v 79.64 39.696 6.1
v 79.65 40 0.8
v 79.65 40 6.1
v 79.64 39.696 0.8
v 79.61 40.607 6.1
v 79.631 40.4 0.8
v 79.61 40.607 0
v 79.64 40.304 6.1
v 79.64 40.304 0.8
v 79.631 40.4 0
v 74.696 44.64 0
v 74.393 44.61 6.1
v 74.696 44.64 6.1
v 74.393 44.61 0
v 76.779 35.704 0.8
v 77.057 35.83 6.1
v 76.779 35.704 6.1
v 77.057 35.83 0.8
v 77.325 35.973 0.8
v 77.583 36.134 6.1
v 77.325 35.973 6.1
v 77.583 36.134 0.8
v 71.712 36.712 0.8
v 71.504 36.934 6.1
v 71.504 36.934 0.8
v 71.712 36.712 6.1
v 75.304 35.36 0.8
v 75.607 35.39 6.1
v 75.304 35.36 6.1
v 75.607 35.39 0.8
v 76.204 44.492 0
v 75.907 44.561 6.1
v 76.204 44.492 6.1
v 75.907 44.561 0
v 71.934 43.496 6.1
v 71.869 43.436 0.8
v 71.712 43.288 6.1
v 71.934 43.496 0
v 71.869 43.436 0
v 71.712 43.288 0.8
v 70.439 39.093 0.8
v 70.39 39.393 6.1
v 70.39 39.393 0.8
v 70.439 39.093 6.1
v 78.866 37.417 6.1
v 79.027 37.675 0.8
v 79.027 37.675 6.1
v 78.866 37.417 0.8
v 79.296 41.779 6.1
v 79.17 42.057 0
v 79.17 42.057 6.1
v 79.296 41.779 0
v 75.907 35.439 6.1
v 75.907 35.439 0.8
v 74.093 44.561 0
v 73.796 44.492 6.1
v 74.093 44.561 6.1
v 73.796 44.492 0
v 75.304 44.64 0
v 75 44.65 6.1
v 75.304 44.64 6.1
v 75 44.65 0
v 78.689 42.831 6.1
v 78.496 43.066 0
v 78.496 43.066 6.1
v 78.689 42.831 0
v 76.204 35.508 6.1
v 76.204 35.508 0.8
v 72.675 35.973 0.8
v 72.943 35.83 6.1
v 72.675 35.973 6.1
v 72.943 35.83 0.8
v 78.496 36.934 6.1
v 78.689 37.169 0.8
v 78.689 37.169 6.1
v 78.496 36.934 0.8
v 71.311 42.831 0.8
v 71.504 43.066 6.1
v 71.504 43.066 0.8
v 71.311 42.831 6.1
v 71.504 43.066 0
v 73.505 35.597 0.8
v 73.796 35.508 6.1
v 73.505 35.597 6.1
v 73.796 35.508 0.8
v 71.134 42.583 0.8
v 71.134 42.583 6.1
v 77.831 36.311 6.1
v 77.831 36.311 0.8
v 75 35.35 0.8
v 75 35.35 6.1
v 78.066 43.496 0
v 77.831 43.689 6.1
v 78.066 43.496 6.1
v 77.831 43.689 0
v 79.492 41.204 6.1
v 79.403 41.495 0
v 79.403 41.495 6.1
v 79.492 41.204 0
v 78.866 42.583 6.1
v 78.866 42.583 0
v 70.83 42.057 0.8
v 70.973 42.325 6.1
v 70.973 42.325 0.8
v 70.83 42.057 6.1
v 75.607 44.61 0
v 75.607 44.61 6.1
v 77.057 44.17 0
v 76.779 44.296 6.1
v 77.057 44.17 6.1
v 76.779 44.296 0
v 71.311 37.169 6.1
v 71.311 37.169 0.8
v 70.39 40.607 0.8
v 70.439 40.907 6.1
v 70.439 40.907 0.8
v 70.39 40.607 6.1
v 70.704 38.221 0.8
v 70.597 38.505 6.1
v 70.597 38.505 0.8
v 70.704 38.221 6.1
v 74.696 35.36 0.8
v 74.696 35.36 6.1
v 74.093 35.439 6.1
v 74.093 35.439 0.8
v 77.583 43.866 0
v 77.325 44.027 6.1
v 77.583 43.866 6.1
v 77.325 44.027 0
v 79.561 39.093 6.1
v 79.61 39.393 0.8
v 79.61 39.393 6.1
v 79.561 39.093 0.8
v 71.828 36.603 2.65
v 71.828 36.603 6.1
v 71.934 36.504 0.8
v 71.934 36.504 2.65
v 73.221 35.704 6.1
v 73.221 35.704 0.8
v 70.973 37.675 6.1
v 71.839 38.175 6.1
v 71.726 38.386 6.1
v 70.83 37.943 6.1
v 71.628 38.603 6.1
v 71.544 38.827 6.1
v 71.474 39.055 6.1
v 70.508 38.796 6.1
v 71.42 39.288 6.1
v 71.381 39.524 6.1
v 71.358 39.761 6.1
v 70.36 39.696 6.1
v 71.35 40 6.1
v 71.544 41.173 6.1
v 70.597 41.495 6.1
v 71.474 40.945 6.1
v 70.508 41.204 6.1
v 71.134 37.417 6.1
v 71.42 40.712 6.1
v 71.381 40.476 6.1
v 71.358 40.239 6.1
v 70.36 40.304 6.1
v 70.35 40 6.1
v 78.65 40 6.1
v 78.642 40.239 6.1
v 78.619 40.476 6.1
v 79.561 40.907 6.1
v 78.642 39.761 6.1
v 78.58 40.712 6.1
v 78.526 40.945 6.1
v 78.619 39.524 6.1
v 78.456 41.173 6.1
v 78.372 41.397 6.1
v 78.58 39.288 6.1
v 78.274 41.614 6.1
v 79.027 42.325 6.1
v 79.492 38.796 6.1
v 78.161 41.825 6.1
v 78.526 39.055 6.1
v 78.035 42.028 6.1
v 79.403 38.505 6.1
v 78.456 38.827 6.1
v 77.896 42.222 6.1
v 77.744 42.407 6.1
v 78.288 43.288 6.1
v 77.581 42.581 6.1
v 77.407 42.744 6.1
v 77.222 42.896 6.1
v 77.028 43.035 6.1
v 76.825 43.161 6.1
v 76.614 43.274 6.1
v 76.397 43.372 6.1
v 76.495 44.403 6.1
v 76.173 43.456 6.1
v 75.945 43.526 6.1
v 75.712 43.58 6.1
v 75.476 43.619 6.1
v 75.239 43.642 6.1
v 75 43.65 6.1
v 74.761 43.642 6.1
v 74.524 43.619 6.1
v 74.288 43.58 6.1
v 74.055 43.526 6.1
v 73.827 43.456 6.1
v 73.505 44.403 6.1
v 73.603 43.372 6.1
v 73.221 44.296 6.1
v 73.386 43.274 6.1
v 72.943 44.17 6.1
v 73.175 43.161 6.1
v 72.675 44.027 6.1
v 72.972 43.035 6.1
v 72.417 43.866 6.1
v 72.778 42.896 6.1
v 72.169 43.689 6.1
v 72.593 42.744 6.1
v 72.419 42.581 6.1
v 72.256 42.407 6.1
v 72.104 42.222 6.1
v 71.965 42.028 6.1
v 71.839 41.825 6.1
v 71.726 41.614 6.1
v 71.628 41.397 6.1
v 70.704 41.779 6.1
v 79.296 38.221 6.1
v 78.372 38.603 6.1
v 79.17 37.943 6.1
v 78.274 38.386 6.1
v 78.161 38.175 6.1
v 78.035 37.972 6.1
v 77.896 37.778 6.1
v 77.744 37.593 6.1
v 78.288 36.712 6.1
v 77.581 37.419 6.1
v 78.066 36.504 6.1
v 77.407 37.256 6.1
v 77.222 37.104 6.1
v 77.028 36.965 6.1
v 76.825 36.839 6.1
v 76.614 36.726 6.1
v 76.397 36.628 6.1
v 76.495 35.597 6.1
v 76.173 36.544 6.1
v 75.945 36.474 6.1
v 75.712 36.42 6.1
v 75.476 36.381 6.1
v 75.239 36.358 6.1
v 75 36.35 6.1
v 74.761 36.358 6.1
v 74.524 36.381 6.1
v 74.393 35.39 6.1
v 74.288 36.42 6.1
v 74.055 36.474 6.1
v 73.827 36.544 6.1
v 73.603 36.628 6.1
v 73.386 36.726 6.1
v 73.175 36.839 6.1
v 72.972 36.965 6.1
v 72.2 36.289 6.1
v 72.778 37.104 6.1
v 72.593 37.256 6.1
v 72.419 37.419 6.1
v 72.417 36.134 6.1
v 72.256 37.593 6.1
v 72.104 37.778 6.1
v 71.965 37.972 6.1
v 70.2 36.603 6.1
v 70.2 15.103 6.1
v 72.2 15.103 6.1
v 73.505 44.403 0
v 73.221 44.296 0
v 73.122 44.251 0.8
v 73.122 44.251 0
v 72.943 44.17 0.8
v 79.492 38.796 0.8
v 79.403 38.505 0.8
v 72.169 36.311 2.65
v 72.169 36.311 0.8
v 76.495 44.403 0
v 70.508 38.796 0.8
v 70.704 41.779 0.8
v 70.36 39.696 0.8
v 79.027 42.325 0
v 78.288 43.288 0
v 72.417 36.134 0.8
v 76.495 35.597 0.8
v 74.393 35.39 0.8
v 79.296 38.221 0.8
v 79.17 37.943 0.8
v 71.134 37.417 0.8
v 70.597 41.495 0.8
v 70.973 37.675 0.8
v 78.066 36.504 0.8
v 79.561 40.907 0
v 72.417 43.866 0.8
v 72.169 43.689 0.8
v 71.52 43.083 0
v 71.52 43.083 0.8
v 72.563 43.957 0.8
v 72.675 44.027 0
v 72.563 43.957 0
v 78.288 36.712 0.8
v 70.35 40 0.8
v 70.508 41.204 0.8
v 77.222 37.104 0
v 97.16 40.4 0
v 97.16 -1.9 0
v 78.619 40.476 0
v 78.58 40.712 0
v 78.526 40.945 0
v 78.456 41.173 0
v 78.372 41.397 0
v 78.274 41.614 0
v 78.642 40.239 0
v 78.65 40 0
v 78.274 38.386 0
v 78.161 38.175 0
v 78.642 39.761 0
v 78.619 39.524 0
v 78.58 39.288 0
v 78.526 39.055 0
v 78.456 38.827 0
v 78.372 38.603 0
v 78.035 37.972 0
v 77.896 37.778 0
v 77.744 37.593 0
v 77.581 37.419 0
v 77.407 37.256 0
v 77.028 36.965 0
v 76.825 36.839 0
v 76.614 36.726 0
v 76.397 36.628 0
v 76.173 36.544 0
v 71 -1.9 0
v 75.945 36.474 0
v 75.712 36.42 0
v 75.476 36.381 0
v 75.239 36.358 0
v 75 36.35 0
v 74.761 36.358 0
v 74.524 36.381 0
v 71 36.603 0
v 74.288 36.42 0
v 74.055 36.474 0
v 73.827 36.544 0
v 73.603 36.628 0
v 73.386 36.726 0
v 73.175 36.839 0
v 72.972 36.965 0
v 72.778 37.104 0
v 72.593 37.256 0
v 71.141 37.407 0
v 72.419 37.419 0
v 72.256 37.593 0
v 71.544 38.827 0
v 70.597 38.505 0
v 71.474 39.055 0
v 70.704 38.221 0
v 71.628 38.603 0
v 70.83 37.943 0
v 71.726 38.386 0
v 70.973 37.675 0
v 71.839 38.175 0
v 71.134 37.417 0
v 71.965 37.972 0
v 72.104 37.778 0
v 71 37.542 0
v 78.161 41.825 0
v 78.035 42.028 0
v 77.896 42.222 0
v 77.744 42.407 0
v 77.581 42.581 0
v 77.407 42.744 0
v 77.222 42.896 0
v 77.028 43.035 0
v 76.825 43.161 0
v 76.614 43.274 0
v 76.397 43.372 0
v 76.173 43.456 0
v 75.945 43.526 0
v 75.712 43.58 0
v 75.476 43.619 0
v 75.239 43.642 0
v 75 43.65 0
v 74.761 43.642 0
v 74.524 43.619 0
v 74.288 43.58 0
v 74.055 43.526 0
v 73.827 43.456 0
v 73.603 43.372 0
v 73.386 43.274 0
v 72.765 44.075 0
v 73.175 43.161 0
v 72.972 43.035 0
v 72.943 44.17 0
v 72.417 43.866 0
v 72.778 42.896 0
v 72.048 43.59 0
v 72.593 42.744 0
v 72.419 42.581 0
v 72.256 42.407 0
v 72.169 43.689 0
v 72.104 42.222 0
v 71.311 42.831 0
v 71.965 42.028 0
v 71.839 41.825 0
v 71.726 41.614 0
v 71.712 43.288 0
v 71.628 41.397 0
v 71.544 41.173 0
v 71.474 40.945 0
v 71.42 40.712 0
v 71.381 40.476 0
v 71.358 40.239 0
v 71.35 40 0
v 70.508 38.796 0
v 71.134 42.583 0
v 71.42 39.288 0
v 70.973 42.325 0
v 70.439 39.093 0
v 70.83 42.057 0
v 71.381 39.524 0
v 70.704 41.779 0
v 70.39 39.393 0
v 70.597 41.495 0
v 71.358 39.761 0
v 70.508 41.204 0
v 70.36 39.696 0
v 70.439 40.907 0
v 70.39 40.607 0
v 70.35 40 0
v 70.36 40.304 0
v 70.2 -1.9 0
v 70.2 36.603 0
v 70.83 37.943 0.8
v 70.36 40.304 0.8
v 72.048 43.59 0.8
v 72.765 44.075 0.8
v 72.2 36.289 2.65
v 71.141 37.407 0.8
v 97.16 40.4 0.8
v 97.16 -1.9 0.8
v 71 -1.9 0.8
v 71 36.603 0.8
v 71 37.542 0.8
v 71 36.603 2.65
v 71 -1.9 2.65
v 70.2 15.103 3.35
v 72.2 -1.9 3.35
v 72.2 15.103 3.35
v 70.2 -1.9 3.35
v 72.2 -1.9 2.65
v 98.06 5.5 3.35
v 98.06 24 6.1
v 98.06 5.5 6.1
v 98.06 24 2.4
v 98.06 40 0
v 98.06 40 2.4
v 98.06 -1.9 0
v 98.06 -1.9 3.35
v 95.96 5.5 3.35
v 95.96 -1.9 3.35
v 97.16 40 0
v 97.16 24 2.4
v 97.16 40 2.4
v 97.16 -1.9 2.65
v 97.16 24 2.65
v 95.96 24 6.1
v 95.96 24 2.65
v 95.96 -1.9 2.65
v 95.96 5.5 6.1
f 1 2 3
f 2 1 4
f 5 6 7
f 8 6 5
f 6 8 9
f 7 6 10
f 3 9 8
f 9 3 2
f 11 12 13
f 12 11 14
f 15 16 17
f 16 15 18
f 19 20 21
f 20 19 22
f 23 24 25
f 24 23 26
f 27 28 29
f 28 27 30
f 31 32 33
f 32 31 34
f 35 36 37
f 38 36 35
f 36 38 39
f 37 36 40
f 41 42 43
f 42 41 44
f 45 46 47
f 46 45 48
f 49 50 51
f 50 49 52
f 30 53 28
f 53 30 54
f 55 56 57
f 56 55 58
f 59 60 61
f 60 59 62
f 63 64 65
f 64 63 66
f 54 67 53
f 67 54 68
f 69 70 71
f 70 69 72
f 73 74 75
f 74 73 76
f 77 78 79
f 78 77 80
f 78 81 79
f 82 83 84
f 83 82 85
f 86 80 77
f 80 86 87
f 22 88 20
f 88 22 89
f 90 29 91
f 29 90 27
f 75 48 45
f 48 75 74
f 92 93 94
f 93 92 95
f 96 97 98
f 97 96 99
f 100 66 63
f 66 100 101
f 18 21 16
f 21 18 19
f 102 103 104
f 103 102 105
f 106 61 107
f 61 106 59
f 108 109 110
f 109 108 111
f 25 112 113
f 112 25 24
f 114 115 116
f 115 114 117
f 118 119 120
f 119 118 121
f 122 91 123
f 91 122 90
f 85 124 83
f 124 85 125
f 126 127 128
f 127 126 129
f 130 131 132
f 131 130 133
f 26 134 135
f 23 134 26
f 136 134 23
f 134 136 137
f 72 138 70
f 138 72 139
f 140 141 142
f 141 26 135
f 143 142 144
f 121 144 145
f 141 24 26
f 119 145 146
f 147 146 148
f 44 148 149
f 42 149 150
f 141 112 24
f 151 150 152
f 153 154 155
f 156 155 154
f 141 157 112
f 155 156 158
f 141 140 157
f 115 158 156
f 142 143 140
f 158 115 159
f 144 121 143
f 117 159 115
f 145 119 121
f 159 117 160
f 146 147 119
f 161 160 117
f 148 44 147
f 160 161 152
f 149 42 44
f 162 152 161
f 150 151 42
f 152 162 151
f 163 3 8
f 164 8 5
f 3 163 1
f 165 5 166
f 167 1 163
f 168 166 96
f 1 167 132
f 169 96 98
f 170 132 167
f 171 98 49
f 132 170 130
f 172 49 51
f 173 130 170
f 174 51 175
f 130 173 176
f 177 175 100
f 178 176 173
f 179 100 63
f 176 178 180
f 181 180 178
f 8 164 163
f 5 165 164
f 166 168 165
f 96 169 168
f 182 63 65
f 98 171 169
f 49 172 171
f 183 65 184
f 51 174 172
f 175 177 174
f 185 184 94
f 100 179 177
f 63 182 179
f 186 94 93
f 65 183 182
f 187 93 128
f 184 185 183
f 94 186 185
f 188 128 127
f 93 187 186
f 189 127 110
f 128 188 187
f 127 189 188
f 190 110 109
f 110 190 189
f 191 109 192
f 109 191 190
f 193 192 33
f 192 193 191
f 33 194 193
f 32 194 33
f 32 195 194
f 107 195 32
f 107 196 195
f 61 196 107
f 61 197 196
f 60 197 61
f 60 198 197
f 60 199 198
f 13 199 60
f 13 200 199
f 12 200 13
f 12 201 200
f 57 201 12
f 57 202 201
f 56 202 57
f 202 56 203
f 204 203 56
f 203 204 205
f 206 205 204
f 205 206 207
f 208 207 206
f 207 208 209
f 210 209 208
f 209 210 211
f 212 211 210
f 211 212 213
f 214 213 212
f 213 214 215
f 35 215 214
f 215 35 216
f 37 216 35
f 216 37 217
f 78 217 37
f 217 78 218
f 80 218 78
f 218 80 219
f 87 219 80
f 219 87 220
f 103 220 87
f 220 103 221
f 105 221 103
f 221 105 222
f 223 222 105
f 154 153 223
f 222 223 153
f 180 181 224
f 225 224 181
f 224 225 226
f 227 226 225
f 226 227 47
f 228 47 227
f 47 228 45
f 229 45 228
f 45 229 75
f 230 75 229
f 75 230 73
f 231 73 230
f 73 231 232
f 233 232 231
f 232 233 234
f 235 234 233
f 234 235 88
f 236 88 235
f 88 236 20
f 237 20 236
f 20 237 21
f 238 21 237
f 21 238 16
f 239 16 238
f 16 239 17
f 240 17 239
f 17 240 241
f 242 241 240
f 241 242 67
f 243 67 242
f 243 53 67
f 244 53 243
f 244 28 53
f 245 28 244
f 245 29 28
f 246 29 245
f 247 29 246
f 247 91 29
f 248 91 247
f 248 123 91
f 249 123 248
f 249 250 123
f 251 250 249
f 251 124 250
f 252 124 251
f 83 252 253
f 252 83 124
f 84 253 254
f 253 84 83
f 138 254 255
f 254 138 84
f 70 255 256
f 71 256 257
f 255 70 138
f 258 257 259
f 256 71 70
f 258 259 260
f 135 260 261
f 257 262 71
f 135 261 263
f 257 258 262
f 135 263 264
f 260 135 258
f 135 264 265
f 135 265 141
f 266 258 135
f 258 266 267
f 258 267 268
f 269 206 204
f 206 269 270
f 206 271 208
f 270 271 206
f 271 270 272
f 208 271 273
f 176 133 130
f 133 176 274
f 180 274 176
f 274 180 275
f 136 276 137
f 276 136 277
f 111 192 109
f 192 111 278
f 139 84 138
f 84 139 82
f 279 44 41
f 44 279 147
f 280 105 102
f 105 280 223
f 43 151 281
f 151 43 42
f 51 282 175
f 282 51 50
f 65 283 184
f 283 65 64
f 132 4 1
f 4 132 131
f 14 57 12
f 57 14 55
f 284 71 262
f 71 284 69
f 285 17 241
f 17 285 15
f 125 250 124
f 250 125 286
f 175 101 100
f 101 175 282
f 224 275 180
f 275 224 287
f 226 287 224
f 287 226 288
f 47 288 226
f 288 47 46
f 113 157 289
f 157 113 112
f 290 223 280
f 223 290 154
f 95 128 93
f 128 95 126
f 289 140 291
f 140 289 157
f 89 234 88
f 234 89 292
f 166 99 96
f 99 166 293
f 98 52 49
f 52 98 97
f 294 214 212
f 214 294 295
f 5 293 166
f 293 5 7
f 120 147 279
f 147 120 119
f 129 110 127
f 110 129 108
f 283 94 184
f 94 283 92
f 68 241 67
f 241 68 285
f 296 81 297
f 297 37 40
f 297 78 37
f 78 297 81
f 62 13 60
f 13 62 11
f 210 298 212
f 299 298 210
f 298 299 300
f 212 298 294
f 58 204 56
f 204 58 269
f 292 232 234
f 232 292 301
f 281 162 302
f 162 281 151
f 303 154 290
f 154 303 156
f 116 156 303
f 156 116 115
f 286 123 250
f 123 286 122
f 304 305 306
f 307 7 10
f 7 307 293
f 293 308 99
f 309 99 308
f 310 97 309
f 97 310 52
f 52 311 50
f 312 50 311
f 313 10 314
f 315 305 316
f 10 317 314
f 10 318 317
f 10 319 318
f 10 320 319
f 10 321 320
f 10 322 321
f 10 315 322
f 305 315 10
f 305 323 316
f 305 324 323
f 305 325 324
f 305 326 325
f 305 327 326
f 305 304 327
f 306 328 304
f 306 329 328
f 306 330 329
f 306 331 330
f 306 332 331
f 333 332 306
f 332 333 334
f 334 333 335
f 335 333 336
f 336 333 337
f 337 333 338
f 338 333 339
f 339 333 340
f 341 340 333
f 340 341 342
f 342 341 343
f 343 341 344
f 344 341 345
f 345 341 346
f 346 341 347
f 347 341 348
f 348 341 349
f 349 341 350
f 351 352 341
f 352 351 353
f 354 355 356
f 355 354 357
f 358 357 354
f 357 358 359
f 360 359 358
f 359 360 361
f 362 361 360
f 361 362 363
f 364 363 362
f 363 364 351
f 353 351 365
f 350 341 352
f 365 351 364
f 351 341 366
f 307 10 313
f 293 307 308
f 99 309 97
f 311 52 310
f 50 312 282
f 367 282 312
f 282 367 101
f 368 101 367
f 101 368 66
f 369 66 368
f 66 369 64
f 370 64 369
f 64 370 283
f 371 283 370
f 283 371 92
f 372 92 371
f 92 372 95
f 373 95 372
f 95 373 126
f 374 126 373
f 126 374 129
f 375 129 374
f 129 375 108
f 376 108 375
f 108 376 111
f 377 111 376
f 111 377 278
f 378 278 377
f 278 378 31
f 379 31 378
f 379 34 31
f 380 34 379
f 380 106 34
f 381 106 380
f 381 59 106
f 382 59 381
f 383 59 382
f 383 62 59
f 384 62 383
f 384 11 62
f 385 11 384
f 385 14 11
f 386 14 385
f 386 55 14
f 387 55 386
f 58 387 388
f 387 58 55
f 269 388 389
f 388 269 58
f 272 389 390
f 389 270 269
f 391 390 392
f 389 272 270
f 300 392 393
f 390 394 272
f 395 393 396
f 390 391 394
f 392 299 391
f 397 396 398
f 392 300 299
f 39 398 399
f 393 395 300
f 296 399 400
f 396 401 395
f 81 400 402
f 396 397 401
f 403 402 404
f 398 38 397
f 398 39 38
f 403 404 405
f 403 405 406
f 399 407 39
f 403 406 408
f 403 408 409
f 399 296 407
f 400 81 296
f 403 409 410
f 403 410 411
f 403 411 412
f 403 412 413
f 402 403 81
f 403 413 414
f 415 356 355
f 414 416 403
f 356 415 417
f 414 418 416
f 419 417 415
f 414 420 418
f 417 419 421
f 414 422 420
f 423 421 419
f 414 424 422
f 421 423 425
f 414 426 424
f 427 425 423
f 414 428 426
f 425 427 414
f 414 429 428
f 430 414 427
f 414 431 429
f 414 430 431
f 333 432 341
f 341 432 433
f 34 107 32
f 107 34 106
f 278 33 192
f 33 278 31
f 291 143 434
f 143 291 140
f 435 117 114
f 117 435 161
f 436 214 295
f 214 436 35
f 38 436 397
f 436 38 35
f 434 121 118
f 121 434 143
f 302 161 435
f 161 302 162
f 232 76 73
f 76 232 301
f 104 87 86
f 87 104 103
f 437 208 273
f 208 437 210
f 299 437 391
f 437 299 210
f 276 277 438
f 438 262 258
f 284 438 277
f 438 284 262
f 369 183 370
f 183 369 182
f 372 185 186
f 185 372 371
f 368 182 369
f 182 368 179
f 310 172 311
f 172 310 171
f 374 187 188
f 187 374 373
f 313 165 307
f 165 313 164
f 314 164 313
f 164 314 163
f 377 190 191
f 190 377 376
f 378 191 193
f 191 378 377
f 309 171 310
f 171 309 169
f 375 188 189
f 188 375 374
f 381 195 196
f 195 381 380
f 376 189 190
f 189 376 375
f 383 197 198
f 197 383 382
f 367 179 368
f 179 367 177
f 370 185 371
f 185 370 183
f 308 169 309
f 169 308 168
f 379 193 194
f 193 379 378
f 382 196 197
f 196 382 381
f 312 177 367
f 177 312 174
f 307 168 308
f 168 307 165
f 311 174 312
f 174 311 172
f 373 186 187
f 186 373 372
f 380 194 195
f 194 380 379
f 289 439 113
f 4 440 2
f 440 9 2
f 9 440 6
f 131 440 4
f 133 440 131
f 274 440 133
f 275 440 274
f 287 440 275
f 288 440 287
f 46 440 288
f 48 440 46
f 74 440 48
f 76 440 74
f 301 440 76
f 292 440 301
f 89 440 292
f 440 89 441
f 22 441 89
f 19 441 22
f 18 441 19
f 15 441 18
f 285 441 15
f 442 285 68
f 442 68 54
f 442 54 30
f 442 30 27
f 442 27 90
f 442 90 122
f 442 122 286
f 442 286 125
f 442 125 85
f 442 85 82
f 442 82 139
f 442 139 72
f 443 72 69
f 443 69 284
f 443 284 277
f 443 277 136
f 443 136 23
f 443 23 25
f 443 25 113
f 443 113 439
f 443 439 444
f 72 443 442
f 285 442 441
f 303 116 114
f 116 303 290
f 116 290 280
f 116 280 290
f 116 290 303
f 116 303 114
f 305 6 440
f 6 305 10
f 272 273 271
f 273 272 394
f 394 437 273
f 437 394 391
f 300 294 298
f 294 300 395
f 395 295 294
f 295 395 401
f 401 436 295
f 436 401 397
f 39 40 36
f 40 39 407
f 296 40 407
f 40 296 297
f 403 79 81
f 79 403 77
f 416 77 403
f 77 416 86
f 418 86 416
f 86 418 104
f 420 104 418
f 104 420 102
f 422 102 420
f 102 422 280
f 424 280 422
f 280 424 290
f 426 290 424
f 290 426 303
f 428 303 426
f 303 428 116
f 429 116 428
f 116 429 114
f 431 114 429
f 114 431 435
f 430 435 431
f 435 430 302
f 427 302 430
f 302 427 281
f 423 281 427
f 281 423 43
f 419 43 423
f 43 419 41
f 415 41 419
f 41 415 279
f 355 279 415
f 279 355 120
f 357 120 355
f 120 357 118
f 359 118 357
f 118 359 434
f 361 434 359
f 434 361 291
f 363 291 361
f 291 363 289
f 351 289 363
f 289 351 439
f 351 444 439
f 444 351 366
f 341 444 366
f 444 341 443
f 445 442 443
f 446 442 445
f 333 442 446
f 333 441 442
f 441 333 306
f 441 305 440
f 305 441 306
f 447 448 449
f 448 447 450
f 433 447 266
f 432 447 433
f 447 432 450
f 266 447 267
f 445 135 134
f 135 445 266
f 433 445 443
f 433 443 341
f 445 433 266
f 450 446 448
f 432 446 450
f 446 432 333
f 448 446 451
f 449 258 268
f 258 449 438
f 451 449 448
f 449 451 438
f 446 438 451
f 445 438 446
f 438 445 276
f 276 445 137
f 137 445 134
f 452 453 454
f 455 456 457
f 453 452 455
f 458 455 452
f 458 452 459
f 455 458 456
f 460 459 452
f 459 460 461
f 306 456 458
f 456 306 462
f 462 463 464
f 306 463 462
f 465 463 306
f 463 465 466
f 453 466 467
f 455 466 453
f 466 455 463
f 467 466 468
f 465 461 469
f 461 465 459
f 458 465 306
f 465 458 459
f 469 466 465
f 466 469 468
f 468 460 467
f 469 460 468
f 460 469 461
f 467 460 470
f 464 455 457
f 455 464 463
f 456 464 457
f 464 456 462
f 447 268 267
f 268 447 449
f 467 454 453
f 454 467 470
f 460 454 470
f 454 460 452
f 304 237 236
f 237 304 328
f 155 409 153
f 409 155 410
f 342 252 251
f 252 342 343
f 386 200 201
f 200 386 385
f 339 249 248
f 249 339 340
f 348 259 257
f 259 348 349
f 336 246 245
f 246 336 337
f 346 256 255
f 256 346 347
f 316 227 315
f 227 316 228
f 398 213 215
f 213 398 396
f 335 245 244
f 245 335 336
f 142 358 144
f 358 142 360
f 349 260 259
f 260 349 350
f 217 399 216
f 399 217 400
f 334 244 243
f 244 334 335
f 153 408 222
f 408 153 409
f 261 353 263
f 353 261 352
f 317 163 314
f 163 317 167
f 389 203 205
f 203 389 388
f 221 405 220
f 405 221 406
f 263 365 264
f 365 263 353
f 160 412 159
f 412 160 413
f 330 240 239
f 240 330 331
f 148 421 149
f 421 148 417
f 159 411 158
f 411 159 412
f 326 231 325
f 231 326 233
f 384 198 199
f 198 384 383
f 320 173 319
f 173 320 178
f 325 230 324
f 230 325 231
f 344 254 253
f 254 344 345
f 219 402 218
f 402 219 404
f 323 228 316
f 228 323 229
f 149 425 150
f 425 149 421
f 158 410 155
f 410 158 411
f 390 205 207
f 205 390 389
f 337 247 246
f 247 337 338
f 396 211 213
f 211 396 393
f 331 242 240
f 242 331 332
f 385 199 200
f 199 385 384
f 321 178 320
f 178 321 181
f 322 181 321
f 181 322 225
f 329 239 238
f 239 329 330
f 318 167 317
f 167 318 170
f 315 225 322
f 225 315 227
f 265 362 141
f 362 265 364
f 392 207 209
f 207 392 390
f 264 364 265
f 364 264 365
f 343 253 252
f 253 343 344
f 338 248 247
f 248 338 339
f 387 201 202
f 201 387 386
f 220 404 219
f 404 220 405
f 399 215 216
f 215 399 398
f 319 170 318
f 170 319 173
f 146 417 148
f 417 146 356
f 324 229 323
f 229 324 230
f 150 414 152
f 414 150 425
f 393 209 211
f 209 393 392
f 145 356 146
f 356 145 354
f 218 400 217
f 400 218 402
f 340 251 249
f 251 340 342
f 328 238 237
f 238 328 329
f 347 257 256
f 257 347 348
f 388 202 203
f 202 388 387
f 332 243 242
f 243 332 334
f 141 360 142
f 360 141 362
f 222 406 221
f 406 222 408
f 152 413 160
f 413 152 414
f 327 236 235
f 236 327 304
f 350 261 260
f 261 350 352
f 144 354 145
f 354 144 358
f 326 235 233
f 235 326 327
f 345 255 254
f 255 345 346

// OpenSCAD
// generated by make_tray.py: the SD board's tray (u, v in mm from the FM-1 board's left and bottom edges)
$fn = 96;
difference() { union() {
  linear_extrude(0.8) union() { intersection() { offset(delta=0.4) polygon([[96.76, -1.5], [71.4, -1.5], [71.4, 36.603], [71.755, 36.262], [72.142, 35.959], [72.557, 35.695], [72.996, 35.474], [73.455, 35.297], [73.929, 35.167], [74.414, 35.085], [74.904, 35.051], [75.396, 35.066], [75.884, 35.13], [76.362, 35.241], [76.828, 35.4], [77.275, 35.604], [77.7, 35.851], [78.099, 36.14], [78.466, 36.466], [78.8, 36.828], [79.096, 37.22], [79.351, 37.64], [79.564, 38.084], [79.732, 38.546], [79.853, 39.023], [79.926, 39.509], [79.95, 40.0], [91.5, 40.0], [91.5, 51.5], [86.0, 51.5], [86.0, 76.7], [96.76, 76.7]]); translate([0, -50]) square([300, 90.4]); }
    translate([75.0, 40.0]) circle(r=4.65); }
  translate([70.200, -1.900, 0.000]) cube([0.800, 38.503, 3.350]);   // the left rail
  translate([70.200, -1.900, 2.650]) cube([2.000, 38.503, 0.700]);   // its lip
  translate([97.160, -1.900, 0.000]) cube([0.900, 25.900, 3.350]);   // the right rail
  translate([95.960, -1.900, 2.650]) cube([2.100, 25.900, 0.700]);   // its lip
  translate([97.160, 24.000, 0.000]) cube([0.900, 16.000, 2.400]);   // the rail above: no higher than the board
  translate([70.200, 15.103, 2.650]) cube([2.000, 21.500, 3.450]);   // a post
  translate([95.960, 5.500, 2.650]) cube([2.100, 18.500, 3.450]);   // a post
  translate([75.0, 40.0, 0]) difference() { cylinder(r=4.65, h=6.1); translate([0, 0, -1]) cylinder(r=3.6500000000000004, h=8.1); }   // the collar
}
  translate([75.0, 40.0, -1]) cylinder(r=3.6500000000000004, h=8.1);
}
